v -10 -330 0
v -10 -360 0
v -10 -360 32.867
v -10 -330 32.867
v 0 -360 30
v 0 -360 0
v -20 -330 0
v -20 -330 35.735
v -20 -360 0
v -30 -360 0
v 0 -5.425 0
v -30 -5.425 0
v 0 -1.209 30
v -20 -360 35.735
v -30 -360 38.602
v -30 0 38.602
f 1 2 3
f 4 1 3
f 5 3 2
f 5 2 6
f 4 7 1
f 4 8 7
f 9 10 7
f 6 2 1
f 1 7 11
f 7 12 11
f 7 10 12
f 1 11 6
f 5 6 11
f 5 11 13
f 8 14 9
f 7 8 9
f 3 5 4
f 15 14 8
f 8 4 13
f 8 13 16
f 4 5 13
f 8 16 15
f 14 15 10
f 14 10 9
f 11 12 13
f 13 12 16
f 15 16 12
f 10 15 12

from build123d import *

# Parameters (mm, degrees)
F1_DEPTH = 360
F3_DEPTH = 30
F5_DEPTH = 30


with BuildPart() as f1:
    # F0 (on Front) → F1 (new body)
    with BuildSketch(Plane.XZ):
        Polygon((-30, 0), (0, 0), (0, 30), (-30, 38.602362), align=None)
    extrude(amount=F1_DEPTH)

    # F2 (on face) → F3 (cut)
    with BuildSketch(Plane(origin=(-30, 0, 0), x_dir=(0, -1, 0), z_dir=(-1, 0, 0))):
        Polygon((5.425208, 0), (0, 38.602362), (0, 0), align=None)
    extrude(amount=-F3_DEPTH, mode=Mode.SUBTRACT)

    # F4 (on face) → F5 (cut)
    with BuildSketch(Plane.XZ.offset(360)):
        Polygon((-20, 0), (-15, 0), (-10, 0), (-10, 32.867454), (-15, 34.301181), (-20, 35.734908), align=None)
    extrude(amount=-F5_DEPTH, mode=Mode.SUBTRACT)


solid = f1.part
